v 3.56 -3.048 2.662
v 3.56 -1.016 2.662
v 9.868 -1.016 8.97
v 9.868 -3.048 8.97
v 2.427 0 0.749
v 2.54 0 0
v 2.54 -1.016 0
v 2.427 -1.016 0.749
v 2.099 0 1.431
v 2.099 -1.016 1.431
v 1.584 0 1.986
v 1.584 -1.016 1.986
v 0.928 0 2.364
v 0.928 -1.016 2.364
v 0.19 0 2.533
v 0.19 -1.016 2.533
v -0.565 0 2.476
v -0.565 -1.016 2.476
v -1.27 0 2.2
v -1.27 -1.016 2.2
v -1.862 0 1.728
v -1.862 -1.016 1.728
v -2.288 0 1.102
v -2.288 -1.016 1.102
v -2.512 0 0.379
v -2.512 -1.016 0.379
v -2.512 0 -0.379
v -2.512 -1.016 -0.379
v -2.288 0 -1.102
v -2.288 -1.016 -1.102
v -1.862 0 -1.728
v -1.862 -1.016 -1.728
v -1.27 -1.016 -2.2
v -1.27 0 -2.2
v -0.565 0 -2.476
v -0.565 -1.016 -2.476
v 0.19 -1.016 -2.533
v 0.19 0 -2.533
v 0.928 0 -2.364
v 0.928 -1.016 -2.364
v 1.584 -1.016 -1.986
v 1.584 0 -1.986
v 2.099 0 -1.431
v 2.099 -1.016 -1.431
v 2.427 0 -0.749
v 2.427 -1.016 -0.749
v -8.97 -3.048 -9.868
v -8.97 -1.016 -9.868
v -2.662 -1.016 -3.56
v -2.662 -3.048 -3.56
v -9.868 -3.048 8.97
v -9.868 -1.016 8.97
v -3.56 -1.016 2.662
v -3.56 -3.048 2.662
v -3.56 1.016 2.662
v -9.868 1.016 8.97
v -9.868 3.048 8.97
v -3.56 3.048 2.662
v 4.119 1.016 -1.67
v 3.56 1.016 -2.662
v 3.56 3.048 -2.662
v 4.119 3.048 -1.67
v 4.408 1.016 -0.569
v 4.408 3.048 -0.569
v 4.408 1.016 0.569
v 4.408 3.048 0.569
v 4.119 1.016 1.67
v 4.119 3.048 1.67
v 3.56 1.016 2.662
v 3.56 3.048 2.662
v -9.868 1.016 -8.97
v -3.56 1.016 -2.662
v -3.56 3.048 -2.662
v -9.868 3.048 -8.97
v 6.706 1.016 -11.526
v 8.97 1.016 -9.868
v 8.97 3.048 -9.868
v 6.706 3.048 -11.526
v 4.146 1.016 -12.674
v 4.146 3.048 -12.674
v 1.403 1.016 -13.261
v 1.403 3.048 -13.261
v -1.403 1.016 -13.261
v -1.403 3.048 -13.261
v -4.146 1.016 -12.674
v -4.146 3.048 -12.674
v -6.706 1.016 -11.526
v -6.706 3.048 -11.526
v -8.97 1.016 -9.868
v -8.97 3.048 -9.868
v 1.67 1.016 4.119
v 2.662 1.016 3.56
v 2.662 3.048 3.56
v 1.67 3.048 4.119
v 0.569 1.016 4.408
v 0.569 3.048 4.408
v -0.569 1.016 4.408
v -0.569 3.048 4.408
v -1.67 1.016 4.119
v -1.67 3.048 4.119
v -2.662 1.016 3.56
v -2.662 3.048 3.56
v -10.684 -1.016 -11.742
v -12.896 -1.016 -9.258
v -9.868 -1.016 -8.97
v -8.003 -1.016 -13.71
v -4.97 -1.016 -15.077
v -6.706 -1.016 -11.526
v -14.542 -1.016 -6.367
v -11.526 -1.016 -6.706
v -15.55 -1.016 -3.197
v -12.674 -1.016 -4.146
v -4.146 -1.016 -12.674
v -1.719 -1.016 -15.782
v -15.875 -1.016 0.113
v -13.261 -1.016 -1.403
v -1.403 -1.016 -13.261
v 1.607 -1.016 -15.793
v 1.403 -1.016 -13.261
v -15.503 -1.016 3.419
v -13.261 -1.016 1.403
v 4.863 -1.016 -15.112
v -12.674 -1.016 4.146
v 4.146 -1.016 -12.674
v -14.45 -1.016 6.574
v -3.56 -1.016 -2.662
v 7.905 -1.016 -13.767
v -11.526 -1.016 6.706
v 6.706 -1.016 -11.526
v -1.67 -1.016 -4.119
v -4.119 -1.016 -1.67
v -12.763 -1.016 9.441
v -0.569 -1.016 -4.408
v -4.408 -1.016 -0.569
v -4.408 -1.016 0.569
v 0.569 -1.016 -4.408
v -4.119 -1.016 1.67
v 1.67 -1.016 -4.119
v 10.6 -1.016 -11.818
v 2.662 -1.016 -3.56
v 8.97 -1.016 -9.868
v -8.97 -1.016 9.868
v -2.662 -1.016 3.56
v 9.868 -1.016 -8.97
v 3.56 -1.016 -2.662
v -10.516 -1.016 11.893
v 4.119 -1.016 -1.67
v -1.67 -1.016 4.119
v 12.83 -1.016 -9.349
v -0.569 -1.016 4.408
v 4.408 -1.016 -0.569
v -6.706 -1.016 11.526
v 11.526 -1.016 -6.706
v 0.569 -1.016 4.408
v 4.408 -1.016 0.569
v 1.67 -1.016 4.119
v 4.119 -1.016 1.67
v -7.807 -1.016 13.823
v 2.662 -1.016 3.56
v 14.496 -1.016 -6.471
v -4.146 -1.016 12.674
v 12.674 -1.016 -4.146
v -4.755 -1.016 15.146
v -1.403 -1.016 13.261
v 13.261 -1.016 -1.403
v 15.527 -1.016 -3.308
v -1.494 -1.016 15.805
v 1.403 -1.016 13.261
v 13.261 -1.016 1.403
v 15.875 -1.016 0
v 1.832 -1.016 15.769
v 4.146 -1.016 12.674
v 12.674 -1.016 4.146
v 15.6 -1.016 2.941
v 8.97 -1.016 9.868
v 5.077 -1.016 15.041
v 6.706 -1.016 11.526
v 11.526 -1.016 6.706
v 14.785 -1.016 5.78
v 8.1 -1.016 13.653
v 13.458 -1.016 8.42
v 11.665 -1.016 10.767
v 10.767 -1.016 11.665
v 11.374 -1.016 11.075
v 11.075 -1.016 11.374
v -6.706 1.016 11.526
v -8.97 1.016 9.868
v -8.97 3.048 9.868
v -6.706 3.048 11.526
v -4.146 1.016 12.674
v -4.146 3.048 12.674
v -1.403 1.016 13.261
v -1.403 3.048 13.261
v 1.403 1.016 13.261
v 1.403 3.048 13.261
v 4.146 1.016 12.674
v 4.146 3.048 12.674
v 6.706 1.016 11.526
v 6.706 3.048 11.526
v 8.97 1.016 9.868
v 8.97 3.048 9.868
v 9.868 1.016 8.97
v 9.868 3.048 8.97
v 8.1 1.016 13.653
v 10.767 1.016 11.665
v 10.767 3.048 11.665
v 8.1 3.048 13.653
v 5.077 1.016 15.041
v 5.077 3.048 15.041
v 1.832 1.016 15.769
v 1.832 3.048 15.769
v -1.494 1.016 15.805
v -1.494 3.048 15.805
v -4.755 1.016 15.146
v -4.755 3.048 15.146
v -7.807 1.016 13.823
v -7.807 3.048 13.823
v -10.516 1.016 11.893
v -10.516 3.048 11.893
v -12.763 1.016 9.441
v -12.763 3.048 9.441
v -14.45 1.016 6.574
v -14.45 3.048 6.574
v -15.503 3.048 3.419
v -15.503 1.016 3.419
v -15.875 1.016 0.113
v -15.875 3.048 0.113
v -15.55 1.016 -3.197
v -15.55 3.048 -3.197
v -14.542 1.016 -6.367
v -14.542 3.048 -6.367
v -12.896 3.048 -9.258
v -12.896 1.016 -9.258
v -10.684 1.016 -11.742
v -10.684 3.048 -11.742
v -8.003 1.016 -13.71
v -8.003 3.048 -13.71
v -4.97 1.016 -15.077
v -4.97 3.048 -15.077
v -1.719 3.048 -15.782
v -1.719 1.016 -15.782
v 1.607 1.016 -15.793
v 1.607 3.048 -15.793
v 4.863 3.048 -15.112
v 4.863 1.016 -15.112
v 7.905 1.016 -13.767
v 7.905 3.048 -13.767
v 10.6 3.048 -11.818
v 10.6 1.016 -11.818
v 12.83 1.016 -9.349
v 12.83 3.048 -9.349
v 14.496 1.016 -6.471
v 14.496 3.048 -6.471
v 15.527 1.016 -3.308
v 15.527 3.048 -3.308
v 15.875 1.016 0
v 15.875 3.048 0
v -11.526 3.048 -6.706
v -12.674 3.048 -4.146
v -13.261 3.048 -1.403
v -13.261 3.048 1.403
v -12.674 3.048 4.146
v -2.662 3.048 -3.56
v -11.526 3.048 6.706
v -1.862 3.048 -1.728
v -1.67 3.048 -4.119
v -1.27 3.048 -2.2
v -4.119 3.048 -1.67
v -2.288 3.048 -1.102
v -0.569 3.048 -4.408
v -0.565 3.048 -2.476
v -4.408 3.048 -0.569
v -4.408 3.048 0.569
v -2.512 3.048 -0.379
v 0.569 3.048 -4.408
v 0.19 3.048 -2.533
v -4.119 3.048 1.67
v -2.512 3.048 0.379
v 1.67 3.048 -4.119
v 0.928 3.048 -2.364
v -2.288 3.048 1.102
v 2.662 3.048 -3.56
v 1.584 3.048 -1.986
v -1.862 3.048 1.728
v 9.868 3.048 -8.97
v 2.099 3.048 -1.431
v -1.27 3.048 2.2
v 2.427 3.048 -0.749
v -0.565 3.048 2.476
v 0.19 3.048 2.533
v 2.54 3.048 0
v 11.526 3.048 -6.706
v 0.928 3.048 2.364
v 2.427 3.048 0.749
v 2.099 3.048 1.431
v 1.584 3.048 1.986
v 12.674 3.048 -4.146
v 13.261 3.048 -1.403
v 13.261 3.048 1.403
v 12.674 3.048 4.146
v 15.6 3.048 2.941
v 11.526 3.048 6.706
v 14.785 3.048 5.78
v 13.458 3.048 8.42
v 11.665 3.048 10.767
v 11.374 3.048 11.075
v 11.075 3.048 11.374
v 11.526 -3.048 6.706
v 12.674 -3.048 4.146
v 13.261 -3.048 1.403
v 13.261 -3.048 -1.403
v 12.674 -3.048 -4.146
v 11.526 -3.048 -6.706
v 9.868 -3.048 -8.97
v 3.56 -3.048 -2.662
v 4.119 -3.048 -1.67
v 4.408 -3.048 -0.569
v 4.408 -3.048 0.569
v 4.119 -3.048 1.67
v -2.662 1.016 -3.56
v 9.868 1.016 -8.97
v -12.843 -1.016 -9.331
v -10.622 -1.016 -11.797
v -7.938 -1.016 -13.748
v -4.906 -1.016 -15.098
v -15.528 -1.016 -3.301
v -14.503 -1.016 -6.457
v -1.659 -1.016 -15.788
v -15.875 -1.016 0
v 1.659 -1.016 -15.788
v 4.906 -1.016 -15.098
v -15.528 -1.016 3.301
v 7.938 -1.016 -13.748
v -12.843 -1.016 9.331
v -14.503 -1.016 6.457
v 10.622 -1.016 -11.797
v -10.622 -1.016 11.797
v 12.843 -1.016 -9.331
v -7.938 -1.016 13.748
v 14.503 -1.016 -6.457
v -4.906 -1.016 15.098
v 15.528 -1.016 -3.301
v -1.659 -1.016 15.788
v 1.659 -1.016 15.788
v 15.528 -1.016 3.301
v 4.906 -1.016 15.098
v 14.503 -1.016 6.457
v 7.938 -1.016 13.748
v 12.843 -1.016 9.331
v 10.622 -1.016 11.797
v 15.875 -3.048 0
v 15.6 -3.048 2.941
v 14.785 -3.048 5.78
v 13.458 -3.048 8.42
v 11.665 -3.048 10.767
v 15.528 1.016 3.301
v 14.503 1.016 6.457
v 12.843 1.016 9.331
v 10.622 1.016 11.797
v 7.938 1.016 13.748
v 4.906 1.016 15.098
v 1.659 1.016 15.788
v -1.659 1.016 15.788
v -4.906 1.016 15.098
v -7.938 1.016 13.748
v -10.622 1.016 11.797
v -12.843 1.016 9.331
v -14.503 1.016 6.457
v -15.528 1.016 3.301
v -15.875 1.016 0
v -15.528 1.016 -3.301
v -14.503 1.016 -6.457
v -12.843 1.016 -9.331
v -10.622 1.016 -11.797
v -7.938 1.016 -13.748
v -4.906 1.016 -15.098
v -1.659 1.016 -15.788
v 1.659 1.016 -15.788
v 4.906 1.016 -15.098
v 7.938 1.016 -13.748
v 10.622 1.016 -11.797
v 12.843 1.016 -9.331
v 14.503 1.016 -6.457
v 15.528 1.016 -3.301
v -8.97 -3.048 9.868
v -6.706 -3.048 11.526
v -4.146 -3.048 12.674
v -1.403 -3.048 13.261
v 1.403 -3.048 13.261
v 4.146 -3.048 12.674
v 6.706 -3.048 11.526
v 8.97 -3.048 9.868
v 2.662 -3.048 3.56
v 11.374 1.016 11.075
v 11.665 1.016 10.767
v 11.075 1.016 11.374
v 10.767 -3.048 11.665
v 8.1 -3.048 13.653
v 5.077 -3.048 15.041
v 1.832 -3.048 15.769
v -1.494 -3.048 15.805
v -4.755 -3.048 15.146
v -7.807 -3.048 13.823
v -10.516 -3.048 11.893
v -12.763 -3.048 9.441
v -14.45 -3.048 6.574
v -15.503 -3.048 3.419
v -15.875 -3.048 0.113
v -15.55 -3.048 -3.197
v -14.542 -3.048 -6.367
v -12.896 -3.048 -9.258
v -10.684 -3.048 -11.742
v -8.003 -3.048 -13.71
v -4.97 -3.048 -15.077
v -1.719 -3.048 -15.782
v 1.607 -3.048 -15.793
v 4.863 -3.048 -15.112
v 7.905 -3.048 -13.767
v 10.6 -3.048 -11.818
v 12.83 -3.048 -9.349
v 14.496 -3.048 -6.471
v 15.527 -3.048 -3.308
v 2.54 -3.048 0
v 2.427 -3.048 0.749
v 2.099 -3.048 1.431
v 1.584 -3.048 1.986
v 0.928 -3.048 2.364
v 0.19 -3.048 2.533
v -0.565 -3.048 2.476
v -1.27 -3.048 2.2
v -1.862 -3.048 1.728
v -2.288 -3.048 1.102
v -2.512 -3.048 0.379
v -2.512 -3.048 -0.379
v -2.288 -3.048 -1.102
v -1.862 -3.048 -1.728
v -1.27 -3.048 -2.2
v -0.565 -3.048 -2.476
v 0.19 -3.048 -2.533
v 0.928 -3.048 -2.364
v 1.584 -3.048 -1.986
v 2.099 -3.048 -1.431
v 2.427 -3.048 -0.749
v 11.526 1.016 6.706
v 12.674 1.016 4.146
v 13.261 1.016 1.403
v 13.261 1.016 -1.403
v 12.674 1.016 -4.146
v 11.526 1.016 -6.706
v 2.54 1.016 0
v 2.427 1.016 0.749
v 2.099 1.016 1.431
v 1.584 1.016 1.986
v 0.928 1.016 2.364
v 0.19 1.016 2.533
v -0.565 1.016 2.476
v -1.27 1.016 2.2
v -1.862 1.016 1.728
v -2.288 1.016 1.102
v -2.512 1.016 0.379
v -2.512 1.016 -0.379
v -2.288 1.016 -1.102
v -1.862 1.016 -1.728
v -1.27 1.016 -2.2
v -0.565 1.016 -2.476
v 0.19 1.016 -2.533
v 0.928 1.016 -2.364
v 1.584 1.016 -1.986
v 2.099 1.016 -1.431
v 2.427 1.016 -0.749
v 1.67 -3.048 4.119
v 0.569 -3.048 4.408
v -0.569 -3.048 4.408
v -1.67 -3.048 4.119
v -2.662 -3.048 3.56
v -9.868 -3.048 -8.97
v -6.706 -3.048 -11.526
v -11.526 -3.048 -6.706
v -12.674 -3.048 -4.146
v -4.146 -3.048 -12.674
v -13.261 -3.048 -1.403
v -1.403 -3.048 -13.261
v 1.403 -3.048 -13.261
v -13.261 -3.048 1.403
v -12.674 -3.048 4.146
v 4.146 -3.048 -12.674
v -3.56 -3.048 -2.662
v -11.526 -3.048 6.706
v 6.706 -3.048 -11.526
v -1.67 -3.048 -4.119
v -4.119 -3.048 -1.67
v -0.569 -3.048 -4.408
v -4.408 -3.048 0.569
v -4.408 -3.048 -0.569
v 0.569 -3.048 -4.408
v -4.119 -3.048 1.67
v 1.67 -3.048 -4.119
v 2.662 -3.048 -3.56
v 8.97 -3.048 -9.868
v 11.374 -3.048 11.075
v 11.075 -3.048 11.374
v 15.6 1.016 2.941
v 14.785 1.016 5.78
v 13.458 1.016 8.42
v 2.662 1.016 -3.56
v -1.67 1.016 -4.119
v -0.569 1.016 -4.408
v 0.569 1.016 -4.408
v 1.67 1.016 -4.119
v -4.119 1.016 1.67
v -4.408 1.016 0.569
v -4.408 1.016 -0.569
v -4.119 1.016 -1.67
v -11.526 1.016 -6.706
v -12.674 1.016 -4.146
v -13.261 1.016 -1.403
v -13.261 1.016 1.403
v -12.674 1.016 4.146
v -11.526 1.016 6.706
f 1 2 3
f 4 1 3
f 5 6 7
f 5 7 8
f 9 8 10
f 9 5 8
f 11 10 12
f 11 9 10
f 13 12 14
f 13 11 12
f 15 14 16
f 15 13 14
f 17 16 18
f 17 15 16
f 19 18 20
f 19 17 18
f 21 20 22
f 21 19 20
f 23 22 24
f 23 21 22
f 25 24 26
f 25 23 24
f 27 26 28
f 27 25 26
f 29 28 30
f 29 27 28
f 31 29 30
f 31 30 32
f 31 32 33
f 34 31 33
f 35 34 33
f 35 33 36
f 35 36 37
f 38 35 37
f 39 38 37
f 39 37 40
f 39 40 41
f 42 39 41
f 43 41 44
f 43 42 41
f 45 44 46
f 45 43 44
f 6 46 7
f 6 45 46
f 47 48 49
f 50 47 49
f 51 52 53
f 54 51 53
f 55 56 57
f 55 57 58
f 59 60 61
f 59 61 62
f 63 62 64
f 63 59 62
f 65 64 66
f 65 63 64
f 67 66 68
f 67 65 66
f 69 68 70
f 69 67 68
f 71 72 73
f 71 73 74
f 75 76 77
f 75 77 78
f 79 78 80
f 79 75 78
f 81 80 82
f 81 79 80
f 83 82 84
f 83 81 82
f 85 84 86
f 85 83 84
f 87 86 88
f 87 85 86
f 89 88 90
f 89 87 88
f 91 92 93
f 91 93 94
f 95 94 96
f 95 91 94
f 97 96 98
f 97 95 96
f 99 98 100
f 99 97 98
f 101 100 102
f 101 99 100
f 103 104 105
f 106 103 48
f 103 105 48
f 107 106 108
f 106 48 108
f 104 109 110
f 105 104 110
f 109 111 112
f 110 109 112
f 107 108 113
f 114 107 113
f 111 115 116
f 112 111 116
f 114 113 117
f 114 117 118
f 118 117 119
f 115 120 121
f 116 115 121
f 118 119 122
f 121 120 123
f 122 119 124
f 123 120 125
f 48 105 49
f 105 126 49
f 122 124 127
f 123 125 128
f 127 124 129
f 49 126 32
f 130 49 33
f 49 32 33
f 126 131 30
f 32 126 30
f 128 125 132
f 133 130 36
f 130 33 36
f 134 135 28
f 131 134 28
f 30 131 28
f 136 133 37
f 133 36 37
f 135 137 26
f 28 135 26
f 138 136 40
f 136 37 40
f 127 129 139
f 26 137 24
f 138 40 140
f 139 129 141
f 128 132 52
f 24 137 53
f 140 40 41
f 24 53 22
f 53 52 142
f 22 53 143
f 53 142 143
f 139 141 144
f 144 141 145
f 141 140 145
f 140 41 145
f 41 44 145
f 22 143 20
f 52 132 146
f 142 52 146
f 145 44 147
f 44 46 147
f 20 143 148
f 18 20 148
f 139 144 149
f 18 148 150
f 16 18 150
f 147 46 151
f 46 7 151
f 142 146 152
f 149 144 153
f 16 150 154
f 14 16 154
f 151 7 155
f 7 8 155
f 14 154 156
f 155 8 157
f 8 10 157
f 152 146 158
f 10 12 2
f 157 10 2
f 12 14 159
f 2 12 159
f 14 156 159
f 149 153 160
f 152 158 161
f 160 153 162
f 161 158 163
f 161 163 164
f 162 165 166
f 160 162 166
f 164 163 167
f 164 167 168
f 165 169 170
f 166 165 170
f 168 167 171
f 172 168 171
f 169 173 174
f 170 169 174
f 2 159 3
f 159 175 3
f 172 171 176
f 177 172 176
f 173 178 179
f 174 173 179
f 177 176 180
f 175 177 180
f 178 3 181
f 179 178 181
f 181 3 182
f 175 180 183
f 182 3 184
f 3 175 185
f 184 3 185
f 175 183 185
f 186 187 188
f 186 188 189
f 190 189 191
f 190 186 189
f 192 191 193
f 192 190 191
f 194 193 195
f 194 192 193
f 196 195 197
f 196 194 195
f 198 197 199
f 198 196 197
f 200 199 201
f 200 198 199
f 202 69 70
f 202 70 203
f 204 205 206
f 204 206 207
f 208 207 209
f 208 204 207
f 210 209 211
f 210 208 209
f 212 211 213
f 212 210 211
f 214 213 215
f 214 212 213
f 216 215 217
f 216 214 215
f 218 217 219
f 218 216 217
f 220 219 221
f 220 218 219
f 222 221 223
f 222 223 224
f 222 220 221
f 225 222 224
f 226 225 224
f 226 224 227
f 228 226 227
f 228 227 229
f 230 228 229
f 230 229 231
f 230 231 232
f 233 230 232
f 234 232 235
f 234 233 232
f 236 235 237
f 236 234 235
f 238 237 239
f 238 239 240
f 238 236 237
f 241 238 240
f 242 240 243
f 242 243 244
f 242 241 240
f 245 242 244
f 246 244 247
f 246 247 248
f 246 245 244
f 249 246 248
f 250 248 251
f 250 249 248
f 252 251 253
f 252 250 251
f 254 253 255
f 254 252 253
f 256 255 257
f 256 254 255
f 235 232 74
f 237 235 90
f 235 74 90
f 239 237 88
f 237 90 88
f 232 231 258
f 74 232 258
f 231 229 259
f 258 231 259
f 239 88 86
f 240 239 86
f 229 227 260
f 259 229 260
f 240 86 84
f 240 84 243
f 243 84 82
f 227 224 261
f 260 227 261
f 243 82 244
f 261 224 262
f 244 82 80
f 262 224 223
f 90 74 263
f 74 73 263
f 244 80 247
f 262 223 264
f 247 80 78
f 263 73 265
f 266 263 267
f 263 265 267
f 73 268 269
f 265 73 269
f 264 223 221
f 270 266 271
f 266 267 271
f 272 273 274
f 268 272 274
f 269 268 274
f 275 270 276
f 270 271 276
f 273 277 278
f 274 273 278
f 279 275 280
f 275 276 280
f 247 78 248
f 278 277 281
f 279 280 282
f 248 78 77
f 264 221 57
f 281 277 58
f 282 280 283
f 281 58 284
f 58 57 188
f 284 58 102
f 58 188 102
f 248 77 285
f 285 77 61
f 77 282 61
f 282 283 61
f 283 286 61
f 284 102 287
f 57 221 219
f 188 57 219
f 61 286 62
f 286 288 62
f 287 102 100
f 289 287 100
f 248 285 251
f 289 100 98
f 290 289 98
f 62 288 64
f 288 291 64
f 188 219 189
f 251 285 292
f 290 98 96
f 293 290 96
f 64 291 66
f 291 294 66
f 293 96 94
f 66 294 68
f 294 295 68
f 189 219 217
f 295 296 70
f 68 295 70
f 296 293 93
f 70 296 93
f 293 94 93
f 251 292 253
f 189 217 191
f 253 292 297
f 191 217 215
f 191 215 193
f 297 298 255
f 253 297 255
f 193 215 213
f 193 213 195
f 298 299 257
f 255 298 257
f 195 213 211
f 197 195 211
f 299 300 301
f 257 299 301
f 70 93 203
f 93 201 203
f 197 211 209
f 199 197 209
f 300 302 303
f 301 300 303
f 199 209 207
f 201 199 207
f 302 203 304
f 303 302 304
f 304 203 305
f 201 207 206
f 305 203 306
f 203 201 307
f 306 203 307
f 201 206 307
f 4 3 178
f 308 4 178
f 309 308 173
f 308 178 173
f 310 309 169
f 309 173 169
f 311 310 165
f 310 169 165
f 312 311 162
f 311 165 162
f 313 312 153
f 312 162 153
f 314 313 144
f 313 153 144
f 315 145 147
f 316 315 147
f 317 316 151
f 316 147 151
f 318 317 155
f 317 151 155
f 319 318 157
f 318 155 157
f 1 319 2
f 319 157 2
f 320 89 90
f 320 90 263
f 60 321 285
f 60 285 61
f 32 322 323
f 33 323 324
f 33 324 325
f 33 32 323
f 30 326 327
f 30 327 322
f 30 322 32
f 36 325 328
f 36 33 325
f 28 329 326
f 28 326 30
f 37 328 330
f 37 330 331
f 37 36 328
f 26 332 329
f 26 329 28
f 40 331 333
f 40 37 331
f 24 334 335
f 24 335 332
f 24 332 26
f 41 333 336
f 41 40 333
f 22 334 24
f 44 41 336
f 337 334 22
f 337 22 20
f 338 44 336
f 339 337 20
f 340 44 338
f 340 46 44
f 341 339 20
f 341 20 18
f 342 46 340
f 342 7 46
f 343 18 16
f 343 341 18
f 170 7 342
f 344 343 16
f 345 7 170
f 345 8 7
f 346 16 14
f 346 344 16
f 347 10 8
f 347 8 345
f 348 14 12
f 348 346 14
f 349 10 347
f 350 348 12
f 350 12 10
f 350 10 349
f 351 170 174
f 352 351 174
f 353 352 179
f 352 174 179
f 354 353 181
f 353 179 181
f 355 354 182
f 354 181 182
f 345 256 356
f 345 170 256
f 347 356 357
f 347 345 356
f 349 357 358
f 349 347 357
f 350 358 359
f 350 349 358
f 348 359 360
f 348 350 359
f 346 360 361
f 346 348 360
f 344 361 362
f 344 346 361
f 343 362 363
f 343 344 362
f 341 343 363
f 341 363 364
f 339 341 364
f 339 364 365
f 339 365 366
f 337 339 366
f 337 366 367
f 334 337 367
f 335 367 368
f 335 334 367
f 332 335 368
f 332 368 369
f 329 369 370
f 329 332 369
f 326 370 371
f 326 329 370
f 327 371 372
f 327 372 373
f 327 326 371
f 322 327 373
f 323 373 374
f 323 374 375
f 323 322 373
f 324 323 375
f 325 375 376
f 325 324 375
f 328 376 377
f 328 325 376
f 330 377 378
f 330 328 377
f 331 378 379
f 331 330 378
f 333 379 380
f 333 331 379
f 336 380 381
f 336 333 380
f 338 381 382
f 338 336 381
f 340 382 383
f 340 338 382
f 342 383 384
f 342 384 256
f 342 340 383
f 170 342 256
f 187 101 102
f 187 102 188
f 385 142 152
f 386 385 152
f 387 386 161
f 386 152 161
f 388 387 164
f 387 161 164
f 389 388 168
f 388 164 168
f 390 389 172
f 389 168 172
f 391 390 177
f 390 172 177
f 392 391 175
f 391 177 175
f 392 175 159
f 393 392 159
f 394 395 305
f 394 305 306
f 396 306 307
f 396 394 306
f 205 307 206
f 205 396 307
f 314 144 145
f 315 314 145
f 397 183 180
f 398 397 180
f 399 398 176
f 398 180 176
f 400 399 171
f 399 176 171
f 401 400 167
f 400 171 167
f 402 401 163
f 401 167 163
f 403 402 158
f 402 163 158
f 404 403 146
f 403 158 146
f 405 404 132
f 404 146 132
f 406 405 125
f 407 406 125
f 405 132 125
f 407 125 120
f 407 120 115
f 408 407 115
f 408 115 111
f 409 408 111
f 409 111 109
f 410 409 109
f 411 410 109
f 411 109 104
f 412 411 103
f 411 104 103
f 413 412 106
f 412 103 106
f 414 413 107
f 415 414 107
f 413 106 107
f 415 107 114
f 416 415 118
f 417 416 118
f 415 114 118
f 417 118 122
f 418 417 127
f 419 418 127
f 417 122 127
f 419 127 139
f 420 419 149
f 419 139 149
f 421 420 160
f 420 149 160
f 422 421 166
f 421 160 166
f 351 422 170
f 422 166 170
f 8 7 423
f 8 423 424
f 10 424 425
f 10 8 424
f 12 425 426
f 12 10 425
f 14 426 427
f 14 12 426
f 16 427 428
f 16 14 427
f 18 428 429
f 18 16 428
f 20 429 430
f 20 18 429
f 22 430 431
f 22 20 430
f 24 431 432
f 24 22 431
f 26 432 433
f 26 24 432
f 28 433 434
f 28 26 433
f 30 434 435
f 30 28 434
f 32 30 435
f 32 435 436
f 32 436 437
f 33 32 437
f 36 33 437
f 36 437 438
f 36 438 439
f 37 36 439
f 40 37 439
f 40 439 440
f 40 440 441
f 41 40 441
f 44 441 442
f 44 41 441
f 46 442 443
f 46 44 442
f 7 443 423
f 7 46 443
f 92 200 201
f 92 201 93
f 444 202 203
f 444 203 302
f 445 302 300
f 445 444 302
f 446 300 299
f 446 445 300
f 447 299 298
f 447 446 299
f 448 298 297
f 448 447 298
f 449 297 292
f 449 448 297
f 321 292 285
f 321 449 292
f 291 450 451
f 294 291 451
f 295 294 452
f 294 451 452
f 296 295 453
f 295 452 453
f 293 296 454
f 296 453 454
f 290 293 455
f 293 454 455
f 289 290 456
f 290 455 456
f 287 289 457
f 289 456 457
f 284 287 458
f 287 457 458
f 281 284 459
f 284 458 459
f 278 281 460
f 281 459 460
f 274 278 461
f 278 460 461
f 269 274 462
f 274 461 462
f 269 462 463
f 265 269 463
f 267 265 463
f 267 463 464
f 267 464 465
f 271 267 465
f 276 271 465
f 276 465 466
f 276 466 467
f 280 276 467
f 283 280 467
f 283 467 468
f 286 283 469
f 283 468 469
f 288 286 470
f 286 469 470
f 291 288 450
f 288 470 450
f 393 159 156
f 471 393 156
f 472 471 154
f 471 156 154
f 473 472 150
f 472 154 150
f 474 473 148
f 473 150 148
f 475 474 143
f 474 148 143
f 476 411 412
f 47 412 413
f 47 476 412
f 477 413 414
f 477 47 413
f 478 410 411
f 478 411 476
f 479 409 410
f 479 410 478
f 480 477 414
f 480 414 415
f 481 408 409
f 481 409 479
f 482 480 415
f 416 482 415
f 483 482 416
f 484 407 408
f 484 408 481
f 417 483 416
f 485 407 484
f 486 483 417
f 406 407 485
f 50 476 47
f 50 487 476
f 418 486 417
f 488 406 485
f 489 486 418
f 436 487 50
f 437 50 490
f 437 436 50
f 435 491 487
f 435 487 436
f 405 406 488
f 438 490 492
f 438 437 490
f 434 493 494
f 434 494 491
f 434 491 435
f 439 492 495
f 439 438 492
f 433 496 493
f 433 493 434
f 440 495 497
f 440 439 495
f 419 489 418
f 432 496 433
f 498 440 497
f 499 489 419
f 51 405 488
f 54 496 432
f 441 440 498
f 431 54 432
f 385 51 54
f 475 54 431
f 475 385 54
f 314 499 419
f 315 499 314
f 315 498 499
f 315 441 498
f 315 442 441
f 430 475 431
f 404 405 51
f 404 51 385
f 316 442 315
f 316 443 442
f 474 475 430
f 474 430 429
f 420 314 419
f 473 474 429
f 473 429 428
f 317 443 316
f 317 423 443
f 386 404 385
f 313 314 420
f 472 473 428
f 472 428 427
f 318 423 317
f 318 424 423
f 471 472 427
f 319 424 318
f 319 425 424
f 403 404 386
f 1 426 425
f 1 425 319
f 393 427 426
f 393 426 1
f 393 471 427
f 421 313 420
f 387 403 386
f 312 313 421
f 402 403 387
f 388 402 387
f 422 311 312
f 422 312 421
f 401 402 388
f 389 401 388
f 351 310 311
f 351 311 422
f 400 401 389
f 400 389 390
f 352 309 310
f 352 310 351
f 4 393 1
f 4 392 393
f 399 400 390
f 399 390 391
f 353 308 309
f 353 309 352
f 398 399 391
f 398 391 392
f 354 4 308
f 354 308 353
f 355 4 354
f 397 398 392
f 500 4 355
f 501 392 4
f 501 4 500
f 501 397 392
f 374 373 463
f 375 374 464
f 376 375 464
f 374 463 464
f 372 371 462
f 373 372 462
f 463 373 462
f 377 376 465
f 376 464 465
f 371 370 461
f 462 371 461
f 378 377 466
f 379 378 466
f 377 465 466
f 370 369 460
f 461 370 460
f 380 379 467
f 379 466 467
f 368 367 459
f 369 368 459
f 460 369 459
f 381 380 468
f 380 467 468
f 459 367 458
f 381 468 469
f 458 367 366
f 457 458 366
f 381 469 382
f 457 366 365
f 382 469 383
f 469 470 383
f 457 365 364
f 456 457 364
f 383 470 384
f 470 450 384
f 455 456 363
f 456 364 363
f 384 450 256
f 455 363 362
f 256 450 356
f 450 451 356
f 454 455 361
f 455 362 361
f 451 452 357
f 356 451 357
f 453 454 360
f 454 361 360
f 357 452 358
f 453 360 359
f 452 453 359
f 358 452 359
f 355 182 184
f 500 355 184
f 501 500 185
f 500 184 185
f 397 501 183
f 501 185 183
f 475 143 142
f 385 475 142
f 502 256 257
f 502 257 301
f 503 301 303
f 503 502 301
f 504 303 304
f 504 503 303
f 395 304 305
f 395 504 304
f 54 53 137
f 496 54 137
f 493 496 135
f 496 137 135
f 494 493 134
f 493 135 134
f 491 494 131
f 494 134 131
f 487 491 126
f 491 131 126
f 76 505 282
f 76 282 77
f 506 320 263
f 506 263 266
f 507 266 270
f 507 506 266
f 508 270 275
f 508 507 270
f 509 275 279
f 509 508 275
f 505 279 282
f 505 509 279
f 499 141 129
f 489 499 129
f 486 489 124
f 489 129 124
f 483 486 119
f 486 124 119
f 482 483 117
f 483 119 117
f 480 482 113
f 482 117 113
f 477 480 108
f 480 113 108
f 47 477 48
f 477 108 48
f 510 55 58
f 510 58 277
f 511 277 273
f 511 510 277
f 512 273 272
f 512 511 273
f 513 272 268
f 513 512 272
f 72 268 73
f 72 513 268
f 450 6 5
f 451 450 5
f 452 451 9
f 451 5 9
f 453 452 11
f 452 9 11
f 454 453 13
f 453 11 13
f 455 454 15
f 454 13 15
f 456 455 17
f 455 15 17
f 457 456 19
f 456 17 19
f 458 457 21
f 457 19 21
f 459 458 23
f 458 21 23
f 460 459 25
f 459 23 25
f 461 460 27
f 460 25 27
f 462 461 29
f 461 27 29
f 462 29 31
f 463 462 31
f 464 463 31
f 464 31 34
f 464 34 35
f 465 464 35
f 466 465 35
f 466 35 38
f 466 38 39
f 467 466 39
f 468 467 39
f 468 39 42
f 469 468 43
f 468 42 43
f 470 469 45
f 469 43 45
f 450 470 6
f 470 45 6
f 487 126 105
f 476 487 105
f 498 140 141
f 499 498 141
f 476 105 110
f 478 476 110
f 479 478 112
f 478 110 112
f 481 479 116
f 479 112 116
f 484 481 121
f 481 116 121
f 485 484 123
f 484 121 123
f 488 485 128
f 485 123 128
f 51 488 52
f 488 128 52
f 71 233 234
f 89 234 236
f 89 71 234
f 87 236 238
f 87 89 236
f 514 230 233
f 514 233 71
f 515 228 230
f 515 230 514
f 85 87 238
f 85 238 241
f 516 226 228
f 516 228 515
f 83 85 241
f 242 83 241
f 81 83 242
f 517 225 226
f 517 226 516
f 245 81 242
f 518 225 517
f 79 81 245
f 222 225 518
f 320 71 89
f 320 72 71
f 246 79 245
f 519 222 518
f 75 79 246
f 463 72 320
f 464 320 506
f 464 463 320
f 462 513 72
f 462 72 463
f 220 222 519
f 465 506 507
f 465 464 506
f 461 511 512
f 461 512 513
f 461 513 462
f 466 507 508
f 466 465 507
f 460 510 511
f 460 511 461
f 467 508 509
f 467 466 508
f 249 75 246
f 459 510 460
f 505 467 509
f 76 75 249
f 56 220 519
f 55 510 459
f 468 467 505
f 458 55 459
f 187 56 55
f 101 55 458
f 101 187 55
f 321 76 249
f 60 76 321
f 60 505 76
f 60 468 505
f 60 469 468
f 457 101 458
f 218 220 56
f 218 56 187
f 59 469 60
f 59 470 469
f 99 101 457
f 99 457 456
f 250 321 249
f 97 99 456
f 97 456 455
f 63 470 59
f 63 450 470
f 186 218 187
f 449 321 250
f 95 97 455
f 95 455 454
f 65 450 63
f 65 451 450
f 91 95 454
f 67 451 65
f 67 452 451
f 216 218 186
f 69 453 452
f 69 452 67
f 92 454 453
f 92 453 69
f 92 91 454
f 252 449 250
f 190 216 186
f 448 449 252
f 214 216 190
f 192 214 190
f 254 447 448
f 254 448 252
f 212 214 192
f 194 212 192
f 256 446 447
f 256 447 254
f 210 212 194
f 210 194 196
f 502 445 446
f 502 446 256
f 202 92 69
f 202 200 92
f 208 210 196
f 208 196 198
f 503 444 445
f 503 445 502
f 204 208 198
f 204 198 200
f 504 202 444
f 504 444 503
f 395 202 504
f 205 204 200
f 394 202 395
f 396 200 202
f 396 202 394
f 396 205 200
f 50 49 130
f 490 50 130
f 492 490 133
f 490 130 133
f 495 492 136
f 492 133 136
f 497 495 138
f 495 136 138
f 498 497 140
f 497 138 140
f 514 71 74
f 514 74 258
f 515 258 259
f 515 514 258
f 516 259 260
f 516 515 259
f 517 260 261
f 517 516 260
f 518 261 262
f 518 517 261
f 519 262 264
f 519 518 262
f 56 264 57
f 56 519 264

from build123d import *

# Parameters (mm, degrees)
F0_R     = 15.875
F0_R_2   = 2.54
F1_DEPTH = 1.016
F2_R     = 2.54
F3_DEPTH = 2.032


with BuildPart() as f1:
    # F0 (on Front) → F1 (new body)
    with BuildSketch(Plane.XZ):
        Circle(F0_R)
        Circle(F0_R_2, mode=Mode.SUBTRACT)
    extrude(amount=F1_DEPTH)

    # F4: F1 across plane


with BuildPart() as f3:
    # F2 (on face) → F3 (new body)
    with BuildSketch(Plane.XZ.offset(1.016)):
        with BuildLine():
            ThreePointArc((15.875, 0), (14.785179, 5.780493), (11.665349, 10.767323))
            ThreePointArc((11.665349, 10.767323), (11.22532, 11.22532), (10.767323, 11.665349))
            ThreePointArc((10.767323, 11.665349), (-14.542126, -6.367274), (15.875, 0))
        make_face()
        with BuildLine():
            Line((-8.969559, -9.867585), (-2.661839, -3.559865))
            ThreePointArc((-2.661839, -3.559865), (0, -4.445), (2.661839, -3.559865))
            Line((2.661839, -3.559865), (8.969559, -9.867585))
            ThreePointArc((8.969559, -9.867585), (0, -13.335), (-8.969559, -9.867585))
        make_face(mode=Mode.SUBTRACT)
        with BuildLine():
            Line((-9.867585, 8.969559), (-3.559865, 2.661839))
            ThreePointArc((-3.559865, 2.661839), (-4.445, 0), (-3.559865, -2.661839))
            Line((-3.559865, -2.661839), (-9.867585, -8.969559))
            ThreePointArc((-9.867585, -8.969559), (-13.335, 0), (-9.867585, 8.969559))
        make_face(mode=Mode.SUBTRACT)
        Circle(F2_R, mode=Mode.SUBTRACT)
        with BuildLine():
            ThreePointArc((3.559865, -2.661839), (4.445, 0), (3.559865, 2.661839))
            Line((3.559865, 2.661839), (9.867585, 8.969559))
            ThreePointArc((9.867585, 8.969559), (13.335, 0), (9.867585, -8.969559))
            Line((9.867585, -8.969559), (3.559865, -2.661839))
        make_face(mode=Mode.SUBTRACT)
        with BuildLine():
            Line((8.969559, 9.867585), (2.661839, 3.559865))
            ThreePointArc((2.661839, 3.559865), (0, 4.445), (-2.661839, 3.559865))
            Line((-2.661839, 3.559865), (-8.969559, 9.867585))
            ThreePointArc((-8.969559, 9.867585), (0, 13.335), (8.969559, 9.867585))
        make_face(mode=Mode.SUBTRACT)
    extrude(amount=F3_DEPTH)


with BuildPart() as f1_1:
    add(f1.part)
    add(f1.part.mirror(Plane.XZ))


with BuildPart() as f5_1:
    # F5: instance of F3
    add(f3.part.mirror(Plane.XZ))


solid = Compound([f3.part, f1_1.part, f5_1.part])
